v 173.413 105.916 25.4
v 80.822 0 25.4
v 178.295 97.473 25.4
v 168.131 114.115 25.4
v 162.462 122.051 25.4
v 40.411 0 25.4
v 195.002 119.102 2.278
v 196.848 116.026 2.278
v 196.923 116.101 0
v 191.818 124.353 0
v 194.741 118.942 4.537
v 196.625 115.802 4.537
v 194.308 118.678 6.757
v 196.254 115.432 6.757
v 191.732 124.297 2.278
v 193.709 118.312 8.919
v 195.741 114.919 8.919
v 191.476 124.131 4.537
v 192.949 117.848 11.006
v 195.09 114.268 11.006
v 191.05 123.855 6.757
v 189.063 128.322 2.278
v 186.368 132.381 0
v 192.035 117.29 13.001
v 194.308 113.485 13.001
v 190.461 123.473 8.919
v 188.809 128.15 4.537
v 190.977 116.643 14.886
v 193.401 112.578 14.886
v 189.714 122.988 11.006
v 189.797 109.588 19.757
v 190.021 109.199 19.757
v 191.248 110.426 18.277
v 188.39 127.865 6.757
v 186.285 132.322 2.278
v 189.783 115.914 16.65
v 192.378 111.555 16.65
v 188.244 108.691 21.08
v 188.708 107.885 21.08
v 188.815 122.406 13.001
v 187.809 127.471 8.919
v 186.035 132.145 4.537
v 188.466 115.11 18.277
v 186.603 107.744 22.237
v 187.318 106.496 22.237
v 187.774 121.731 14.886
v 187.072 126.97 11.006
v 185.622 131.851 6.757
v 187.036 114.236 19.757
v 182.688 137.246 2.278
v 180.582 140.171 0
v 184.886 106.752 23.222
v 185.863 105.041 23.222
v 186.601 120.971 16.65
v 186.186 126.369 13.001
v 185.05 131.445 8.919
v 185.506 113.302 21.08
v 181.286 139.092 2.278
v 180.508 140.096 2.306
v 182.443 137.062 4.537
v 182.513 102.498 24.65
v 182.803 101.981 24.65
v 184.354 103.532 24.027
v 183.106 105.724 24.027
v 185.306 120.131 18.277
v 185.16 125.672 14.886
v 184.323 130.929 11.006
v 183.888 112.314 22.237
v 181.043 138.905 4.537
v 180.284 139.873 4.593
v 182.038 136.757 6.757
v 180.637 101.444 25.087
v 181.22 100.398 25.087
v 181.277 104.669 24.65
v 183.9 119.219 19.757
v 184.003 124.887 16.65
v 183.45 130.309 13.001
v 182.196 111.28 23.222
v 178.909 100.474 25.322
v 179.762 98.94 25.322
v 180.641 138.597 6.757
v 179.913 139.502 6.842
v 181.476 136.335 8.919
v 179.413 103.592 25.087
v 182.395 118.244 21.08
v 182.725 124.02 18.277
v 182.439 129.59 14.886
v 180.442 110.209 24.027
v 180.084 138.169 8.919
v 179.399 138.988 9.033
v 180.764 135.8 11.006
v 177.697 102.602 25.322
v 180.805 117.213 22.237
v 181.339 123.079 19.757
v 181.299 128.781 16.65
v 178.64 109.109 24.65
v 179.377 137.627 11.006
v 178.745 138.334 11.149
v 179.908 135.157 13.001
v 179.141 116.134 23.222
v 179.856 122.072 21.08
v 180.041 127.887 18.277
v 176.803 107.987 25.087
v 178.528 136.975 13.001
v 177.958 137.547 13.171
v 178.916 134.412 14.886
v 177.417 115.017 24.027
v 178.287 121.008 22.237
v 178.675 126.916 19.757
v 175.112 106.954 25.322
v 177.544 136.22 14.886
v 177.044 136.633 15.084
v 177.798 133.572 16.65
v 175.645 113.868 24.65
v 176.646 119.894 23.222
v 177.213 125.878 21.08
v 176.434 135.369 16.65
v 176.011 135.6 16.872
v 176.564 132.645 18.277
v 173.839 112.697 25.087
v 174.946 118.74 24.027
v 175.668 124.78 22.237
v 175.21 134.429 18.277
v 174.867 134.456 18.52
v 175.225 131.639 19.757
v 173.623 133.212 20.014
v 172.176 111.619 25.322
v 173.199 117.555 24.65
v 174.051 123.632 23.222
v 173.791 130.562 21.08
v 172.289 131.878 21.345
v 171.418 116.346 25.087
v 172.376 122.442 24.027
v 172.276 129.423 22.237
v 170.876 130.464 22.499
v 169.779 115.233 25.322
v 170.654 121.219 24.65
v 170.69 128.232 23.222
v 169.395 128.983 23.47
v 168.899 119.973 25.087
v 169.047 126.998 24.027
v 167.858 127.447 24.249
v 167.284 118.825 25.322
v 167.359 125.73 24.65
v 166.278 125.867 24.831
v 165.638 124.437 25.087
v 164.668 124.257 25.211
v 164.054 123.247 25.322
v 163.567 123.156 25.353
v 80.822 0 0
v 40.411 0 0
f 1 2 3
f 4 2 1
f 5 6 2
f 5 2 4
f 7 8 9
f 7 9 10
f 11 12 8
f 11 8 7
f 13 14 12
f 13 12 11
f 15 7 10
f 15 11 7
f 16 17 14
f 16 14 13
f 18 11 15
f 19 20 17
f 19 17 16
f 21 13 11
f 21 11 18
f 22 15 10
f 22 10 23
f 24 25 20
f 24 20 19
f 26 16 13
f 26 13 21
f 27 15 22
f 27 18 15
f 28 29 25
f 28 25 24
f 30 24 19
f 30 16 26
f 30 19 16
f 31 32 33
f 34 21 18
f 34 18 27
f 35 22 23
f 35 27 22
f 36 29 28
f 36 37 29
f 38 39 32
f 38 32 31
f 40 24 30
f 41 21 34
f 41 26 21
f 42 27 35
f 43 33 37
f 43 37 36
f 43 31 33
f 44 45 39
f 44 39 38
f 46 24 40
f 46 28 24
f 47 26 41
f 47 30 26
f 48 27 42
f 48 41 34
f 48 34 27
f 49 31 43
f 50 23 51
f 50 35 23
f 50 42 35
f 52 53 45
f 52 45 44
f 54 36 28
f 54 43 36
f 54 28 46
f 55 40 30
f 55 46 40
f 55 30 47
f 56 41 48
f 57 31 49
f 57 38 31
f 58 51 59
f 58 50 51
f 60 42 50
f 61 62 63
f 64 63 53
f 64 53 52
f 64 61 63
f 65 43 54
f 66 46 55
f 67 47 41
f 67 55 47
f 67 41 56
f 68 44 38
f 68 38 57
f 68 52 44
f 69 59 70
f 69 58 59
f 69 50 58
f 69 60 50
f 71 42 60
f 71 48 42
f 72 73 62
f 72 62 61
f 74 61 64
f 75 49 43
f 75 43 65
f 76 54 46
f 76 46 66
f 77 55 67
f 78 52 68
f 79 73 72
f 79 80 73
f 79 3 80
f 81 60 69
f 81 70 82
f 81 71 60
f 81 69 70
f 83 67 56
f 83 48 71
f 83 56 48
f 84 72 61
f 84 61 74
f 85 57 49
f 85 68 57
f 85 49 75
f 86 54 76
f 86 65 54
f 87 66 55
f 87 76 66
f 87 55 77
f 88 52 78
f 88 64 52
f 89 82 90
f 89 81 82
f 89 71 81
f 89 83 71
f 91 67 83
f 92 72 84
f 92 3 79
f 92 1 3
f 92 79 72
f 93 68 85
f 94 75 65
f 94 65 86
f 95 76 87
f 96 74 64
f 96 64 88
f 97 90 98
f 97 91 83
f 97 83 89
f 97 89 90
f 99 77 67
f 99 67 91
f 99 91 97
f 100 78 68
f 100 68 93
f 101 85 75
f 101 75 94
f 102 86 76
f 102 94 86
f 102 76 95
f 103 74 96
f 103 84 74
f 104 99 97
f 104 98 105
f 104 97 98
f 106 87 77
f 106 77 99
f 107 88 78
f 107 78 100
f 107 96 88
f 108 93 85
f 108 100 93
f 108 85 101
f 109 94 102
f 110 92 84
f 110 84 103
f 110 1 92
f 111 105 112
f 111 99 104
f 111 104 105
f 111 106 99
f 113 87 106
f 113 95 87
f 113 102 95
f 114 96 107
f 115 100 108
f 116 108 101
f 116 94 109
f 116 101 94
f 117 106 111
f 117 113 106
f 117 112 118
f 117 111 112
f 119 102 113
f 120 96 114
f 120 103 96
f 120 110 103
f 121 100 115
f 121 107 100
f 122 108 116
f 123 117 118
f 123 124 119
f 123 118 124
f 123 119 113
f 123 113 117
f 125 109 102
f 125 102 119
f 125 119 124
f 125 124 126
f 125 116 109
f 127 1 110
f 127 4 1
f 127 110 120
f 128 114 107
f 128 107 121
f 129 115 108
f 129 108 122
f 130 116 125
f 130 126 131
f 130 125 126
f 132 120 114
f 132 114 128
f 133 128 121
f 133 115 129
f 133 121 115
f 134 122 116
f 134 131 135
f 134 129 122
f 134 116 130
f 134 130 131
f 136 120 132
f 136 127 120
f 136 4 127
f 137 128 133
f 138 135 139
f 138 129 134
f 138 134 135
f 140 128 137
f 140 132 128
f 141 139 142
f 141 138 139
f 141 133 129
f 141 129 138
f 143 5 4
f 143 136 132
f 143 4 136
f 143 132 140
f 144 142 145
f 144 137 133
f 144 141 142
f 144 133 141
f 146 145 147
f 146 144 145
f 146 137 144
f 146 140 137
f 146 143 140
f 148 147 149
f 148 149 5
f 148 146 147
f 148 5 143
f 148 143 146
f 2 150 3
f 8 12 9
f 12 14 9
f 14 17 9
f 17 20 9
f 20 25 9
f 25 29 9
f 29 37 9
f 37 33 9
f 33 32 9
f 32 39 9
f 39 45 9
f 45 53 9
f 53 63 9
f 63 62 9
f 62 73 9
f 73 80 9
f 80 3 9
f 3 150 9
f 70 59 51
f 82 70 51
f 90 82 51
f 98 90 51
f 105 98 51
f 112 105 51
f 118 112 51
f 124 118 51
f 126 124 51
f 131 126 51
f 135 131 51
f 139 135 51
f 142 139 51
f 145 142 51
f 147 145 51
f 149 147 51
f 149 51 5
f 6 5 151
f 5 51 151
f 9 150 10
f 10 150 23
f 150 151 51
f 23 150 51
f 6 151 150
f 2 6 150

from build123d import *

# Parameters (mm, degrees)
F2_DEPTH = 25.4
F3_R     = 25.39999


# Not quite as in the source:
# - a fillet or chamfer is up to 0.001 mm smaller than in the source, because OpenCascade refuses the exact size


with BuildPart() as f2:
    # F1 (on face) → F2 (new body)
    with BuildSketch(Plane.XY):
        with BuildLine():
            Line((180.582366013, 140.1712134682), (40.4111525448, 0))
            Line((40.4111525448, 0), (80.8223050896, 0))
            Line((80.8223050896, 0), (196.9228733519, 116.1005682623))
            ThreePointArc((196.9228733519, 116.1005682623), (189.1359310844, 128.3961041965), (180.582366013, 140.1712134682))
        make_face()
    extrude(amount=F2_DEPTH)

    # F3 (radius 25.4 in the source; OpenCascade refuses exactly that, so slightly less here)
    f3_edges = [f2.edges().sort_by_distance(p)[0] for p in [
        (189.135931, 128.396104, 25.4),
    ]]
    fillet(f3_edges, radius=F3_R)


solid = f2.part
